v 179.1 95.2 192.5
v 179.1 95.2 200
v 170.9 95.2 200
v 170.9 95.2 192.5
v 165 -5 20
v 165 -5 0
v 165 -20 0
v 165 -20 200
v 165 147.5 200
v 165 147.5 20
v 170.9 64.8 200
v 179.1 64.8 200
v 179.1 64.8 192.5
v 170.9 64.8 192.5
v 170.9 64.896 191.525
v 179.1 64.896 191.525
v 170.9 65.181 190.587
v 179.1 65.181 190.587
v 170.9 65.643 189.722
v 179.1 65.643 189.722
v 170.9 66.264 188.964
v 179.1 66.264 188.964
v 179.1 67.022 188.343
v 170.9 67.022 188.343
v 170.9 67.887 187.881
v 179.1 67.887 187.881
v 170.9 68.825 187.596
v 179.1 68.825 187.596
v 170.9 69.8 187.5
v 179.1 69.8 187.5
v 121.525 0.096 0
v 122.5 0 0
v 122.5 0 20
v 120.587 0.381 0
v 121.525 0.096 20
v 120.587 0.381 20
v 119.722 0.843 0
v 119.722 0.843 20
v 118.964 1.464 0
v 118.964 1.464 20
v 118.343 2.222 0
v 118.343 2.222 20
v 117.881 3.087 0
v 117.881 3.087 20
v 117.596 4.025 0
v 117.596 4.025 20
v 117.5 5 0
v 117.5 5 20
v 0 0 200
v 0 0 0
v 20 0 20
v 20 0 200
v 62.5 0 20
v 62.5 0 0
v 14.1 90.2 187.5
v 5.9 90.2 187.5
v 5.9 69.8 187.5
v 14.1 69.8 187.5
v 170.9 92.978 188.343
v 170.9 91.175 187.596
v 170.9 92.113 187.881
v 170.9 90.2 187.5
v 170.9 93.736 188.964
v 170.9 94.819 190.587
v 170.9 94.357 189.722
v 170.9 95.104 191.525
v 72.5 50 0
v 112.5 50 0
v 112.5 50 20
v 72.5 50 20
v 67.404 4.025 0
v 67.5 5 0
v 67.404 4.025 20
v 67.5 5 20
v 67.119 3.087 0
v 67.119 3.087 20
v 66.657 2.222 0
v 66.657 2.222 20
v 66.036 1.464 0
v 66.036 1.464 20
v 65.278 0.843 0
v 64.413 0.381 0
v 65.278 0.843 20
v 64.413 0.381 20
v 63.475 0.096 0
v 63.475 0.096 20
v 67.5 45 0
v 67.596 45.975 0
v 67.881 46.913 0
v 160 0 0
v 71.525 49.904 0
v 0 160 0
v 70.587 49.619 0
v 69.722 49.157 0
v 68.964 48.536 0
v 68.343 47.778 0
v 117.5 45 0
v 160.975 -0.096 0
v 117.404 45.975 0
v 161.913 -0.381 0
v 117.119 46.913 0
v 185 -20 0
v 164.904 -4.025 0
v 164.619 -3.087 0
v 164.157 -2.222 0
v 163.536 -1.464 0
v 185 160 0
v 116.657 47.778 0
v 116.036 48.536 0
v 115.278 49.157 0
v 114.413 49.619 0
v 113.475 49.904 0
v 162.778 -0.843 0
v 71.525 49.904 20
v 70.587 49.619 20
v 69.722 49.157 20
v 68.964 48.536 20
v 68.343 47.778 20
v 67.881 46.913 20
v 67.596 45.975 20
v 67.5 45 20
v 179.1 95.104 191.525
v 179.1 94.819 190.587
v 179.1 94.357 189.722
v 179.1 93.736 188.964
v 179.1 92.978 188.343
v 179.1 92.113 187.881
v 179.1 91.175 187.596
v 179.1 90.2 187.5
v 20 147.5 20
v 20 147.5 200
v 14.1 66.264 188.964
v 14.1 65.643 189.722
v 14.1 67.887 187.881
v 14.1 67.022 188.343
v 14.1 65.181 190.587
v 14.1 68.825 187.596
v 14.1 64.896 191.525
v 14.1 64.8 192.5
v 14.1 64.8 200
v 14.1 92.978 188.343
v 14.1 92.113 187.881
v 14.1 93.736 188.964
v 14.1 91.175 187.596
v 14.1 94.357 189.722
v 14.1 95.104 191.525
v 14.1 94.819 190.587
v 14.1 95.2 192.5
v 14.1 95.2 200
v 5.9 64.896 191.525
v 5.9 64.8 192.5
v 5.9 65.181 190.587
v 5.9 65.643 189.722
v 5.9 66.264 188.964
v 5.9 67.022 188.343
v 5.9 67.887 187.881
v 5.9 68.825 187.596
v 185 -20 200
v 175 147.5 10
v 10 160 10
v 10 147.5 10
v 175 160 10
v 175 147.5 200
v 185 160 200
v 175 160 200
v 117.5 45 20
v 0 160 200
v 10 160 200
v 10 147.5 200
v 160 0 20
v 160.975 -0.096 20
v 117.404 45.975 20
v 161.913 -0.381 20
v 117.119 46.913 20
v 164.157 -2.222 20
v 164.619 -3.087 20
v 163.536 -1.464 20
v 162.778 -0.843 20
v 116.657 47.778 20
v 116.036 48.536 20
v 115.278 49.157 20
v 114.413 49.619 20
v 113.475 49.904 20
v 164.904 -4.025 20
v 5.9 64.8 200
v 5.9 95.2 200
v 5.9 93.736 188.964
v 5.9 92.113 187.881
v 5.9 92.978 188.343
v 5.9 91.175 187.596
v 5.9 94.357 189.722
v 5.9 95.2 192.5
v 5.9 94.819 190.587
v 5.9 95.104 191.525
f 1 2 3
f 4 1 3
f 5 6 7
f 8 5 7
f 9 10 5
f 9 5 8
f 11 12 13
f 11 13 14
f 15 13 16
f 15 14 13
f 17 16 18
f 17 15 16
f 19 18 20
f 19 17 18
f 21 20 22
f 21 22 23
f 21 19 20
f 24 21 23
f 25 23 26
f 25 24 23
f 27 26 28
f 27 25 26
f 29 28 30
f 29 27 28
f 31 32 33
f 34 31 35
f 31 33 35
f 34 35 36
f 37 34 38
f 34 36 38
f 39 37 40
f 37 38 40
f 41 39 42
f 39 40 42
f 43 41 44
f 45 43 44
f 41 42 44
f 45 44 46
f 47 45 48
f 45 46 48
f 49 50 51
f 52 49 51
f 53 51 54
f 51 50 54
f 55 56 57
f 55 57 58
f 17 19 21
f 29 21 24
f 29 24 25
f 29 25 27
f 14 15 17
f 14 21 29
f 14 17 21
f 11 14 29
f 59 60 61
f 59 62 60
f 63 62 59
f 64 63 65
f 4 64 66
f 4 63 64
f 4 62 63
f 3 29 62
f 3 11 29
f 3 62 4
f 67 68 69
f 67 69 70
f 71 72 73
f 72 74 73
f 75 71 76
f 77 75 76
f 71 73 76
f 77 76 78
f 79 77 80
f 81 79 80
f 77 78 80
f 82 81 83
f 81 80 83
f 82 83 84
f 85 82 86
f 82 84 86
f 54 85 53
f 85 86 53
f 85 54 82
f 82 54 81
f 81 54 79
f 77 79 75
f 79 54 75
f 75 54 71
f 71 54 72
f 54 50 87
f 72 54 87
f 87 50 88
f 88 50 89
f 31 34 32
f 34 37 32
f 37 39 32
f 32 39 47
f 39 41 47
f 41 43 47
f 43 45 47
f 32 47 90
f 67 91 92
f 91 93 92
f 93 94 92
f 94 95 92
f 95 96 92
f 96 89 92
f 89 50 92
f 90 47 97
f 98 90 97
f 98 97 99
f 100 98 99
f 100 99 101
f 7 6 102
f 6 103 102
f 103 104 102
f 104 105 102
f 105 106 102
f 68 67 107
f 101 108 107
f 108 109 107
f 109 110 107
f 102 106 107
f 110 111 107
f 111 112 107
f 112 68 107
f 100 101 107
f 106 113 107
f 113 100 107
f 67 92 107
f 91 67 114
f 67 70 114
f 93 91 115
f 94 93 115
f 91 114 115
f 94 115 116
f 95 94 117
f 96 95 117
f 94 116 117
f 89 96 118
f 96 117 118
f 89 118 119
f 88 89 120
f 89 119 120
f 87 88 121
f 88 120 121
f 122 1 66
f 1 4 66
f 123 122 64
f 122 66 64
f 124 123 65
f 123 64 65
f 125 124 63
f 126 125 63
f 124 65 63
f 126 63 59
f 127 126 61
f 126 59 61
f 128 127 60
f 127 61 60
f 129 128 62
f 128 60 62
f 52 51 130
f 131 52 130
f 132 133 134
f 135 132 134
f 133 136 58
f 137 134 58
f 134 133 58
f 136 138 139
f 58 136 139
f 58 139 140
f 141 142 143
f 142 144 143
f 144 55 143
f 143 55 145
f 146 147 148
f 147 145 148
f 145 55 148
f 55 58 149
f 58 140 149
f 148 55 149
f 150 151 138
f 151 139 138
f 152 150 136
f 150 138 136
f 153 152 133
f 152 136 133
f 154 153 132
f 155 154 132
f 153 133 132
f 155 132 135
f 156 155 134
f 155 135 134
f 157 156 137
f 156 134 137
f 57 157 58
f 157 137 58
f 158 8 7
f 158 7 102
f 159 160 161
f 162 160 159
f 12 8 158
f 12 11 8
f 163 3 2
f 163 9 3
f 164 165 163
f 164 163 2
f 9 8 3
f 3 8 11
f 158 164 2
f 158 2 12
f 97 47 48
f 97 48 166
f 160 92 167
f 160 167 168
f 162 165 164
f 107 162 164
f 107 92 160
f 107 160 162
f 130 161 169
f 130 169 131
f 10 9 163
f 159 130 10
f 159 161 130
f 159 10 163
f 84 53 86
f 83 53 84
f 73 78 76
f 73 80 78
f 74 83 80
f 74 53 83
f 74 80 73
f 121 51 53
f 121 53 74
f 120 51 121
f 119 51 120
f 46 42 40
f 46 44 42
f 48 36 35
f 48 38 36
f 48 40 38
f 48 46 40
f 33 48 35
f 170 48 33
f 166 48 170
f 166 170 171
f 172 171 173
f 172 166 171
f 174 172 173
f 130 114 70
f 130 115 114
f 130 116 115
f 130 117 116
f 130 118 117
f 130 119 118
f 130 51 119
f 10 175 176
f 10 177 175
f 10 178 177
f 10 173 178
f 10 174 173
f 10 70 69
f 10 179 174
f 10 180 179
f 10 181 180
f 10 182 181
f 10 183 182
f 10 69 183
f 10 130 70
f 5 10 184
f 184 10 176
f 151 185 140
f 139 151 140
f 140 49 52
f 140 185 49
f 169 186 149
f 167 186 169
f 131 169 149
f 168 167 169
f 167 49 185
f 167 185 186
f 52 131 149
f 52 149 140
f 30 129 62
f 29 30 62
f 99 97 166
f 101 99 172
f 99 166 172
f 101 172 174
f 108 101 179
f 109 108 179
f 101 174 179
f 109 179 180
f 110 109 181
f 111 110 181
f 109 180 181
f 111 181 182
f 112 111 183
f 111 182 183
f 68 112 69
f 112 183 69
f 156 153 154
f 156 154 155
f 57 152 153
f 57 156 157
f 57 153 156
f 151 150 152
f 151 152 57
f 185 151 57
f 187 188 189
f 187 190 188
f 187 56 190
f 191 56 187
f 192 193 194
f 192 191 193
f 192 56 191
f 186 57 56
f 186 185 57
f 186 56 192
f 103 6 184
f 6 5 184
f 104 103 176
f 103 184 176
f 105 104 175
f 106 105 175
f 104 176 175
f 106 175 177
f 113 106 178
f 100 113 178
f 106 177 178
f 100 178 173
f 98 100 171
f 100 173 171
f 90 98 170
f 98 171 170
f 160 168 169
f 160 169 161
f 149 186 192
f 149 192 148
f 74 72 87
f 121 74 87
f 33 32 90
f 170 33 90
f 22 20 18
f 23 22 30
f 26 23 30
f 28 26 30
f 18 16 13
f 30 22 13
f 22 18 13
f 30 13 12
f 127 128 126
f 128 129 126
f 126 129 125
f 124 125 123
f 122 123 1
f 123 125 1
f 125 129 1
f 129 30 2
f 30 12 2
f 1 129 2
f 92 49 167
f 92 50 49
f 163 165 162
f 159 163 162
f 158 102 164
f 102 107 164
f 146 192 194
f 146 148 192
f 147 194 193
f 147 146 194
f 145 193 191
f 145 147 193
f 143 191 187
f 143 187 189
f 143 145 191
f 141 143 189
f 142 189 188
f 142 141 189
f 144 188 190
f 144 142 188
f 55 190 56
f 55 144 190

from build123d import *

# Parameters (mm, degrees)
SKETCH1_W            = 185
SKETCH1_H            = 160
BOSS_EXTRUDE1_DEPTH  = 20
SKETCH2_W            = 20
SKETCH2_H            = 160
BOSS_EXTRUDE2_DEPTH  = 180
SKETCH4_W            = 50
SKETCH4_H            = 50
CUT_EXTRUDE1_DEPTH   = 201
SKETCH3_W            = 20
SKETCH3_H            = 200
BOSS_EXTRUDE3_DEPTH  = 20
FILLET1_R            = 5
SKETCH6_W            = 8.2
SKETCH6_H            = 30.4
CUT_EXTRUDE2_DEPTH   = 12.5
FILLET2_R            = 5
FILLET2_OF_MIRROR1_R = 5
SKETCH7_W            = 165
SKETCH7_H            = 190
CUT_EXTRUDE3_DEPTH   = 12.5


with BuildPart() as part:
    # Sketch1 → Boss-Extrude1 (new body)
    with BuildSketch(Plane.XY):
        with Locations((92.5, 80)):
            Rectangle(SKETCH1_W, SKETCH1_H)
    extrude(amount=BOSS_EXTRUDE1_DEPTH)

    # Sketch2 → Boss-Extrude2 (add)
    with BuildSketch(Plane.XY.offset(20)):
        with Locations((10, 80)):
            Rectangle(SKETCH2_W, SKETCH2_H)
        with Locations((175, 80)):
            Rectangle(SKETCH2_W, SKETCH2_H)
    extrude(amount=BOSS_EXTRUDE2_DEPTH)

    # Sketch4 → Cut-Extrude1 (cut, through all)
    with BuildSketch(Plane(origin=(0, 0, 0), x_dir=(-1, 0, 0), z_dir=(0, 0, -1))):
        with Locations((-92.5, 25)):
            Rectangle(SKETCH4_W, SKETCH4_H)
    extrude(amount=-CUT_EXTRUDE1_DEPTH, mode=Mode.SUBTRACT)

    # Sketch3 → Boss-Extrude3 (add)
    with BuildSketch(Plane.XZ):
        with Locations((175, 100)):
            Rectangle(SKETCH3_W, SKETCH3_H)
    extrude(amount=BOSS_EXTRUDE3_DEPTH)

    # Fillet1
    fillet1_edges = [part.edges().sort_by_distance(p)[0] for p in [
        (67.5, 50, 10),
        (67.5, 0, 10),
        (117.5, 0, 10),
        (117.5, 50, 10),
        (165, 0, 10),
    ]]
    fillet(fillet1_edges, radius=FILLET1_R)

    # Sketch6 → Cut-Extrude2 (cut)
    with BuildSketch(Plane.XY.offset(200)):
        with Locations((10, 80)):
            Rectangle(SKETCH6_W, SKETCH6_H)
    cut_extrude2 = extrude(amount=-CUT_EXTRUDE2_DEPTH, mode=Mode.SUBTRACT)

    # Fillet2
    fillet2_edges = [part.edges().sort_by_distance(p)[0] for p in [
        (10, 64.8, 187.5),
        (10, 95.2, 187.5),
    ]]
    fillet(fillet2_edges, radius=FILLET2_R)

    # Mirror1: Cut-Extrude2 across plane
    add(cut_extrude2.mirror(Plane(origin=(92.5, 0, 0), x_dir=(0, 0, 1), z_dir=(1, 0, 0))), mode=Mode.SUBTRACT)

    # Fillet2 of Mirror1
    fillet2_of_mirror1_edges = [part.edges().sort_by_distance(p)[0] for p in [
        (175, 64.8, 187.5),
        (175, 95.2, 187.5),
    ]]
    fillet(fillet2_of_mirror1_edges, radius=FILLET2_OF_MIRROR1_R)

    # Sketch7 → Cut-Extrude3 (cut)
    with BuildSketch(Plane(origin=(0, 160, 0), x_dir=(1, 0, 0), z_dir=(0, 1, 0))):
        with Locations((92.5, -105)):
            Rectangle(SKETCH7_W, SKETCH7_H)
    extrude(amount=-CUT_EXTRUDE3_DEPTH, mode=Mode.SUBTRACT)


solid = part.part
